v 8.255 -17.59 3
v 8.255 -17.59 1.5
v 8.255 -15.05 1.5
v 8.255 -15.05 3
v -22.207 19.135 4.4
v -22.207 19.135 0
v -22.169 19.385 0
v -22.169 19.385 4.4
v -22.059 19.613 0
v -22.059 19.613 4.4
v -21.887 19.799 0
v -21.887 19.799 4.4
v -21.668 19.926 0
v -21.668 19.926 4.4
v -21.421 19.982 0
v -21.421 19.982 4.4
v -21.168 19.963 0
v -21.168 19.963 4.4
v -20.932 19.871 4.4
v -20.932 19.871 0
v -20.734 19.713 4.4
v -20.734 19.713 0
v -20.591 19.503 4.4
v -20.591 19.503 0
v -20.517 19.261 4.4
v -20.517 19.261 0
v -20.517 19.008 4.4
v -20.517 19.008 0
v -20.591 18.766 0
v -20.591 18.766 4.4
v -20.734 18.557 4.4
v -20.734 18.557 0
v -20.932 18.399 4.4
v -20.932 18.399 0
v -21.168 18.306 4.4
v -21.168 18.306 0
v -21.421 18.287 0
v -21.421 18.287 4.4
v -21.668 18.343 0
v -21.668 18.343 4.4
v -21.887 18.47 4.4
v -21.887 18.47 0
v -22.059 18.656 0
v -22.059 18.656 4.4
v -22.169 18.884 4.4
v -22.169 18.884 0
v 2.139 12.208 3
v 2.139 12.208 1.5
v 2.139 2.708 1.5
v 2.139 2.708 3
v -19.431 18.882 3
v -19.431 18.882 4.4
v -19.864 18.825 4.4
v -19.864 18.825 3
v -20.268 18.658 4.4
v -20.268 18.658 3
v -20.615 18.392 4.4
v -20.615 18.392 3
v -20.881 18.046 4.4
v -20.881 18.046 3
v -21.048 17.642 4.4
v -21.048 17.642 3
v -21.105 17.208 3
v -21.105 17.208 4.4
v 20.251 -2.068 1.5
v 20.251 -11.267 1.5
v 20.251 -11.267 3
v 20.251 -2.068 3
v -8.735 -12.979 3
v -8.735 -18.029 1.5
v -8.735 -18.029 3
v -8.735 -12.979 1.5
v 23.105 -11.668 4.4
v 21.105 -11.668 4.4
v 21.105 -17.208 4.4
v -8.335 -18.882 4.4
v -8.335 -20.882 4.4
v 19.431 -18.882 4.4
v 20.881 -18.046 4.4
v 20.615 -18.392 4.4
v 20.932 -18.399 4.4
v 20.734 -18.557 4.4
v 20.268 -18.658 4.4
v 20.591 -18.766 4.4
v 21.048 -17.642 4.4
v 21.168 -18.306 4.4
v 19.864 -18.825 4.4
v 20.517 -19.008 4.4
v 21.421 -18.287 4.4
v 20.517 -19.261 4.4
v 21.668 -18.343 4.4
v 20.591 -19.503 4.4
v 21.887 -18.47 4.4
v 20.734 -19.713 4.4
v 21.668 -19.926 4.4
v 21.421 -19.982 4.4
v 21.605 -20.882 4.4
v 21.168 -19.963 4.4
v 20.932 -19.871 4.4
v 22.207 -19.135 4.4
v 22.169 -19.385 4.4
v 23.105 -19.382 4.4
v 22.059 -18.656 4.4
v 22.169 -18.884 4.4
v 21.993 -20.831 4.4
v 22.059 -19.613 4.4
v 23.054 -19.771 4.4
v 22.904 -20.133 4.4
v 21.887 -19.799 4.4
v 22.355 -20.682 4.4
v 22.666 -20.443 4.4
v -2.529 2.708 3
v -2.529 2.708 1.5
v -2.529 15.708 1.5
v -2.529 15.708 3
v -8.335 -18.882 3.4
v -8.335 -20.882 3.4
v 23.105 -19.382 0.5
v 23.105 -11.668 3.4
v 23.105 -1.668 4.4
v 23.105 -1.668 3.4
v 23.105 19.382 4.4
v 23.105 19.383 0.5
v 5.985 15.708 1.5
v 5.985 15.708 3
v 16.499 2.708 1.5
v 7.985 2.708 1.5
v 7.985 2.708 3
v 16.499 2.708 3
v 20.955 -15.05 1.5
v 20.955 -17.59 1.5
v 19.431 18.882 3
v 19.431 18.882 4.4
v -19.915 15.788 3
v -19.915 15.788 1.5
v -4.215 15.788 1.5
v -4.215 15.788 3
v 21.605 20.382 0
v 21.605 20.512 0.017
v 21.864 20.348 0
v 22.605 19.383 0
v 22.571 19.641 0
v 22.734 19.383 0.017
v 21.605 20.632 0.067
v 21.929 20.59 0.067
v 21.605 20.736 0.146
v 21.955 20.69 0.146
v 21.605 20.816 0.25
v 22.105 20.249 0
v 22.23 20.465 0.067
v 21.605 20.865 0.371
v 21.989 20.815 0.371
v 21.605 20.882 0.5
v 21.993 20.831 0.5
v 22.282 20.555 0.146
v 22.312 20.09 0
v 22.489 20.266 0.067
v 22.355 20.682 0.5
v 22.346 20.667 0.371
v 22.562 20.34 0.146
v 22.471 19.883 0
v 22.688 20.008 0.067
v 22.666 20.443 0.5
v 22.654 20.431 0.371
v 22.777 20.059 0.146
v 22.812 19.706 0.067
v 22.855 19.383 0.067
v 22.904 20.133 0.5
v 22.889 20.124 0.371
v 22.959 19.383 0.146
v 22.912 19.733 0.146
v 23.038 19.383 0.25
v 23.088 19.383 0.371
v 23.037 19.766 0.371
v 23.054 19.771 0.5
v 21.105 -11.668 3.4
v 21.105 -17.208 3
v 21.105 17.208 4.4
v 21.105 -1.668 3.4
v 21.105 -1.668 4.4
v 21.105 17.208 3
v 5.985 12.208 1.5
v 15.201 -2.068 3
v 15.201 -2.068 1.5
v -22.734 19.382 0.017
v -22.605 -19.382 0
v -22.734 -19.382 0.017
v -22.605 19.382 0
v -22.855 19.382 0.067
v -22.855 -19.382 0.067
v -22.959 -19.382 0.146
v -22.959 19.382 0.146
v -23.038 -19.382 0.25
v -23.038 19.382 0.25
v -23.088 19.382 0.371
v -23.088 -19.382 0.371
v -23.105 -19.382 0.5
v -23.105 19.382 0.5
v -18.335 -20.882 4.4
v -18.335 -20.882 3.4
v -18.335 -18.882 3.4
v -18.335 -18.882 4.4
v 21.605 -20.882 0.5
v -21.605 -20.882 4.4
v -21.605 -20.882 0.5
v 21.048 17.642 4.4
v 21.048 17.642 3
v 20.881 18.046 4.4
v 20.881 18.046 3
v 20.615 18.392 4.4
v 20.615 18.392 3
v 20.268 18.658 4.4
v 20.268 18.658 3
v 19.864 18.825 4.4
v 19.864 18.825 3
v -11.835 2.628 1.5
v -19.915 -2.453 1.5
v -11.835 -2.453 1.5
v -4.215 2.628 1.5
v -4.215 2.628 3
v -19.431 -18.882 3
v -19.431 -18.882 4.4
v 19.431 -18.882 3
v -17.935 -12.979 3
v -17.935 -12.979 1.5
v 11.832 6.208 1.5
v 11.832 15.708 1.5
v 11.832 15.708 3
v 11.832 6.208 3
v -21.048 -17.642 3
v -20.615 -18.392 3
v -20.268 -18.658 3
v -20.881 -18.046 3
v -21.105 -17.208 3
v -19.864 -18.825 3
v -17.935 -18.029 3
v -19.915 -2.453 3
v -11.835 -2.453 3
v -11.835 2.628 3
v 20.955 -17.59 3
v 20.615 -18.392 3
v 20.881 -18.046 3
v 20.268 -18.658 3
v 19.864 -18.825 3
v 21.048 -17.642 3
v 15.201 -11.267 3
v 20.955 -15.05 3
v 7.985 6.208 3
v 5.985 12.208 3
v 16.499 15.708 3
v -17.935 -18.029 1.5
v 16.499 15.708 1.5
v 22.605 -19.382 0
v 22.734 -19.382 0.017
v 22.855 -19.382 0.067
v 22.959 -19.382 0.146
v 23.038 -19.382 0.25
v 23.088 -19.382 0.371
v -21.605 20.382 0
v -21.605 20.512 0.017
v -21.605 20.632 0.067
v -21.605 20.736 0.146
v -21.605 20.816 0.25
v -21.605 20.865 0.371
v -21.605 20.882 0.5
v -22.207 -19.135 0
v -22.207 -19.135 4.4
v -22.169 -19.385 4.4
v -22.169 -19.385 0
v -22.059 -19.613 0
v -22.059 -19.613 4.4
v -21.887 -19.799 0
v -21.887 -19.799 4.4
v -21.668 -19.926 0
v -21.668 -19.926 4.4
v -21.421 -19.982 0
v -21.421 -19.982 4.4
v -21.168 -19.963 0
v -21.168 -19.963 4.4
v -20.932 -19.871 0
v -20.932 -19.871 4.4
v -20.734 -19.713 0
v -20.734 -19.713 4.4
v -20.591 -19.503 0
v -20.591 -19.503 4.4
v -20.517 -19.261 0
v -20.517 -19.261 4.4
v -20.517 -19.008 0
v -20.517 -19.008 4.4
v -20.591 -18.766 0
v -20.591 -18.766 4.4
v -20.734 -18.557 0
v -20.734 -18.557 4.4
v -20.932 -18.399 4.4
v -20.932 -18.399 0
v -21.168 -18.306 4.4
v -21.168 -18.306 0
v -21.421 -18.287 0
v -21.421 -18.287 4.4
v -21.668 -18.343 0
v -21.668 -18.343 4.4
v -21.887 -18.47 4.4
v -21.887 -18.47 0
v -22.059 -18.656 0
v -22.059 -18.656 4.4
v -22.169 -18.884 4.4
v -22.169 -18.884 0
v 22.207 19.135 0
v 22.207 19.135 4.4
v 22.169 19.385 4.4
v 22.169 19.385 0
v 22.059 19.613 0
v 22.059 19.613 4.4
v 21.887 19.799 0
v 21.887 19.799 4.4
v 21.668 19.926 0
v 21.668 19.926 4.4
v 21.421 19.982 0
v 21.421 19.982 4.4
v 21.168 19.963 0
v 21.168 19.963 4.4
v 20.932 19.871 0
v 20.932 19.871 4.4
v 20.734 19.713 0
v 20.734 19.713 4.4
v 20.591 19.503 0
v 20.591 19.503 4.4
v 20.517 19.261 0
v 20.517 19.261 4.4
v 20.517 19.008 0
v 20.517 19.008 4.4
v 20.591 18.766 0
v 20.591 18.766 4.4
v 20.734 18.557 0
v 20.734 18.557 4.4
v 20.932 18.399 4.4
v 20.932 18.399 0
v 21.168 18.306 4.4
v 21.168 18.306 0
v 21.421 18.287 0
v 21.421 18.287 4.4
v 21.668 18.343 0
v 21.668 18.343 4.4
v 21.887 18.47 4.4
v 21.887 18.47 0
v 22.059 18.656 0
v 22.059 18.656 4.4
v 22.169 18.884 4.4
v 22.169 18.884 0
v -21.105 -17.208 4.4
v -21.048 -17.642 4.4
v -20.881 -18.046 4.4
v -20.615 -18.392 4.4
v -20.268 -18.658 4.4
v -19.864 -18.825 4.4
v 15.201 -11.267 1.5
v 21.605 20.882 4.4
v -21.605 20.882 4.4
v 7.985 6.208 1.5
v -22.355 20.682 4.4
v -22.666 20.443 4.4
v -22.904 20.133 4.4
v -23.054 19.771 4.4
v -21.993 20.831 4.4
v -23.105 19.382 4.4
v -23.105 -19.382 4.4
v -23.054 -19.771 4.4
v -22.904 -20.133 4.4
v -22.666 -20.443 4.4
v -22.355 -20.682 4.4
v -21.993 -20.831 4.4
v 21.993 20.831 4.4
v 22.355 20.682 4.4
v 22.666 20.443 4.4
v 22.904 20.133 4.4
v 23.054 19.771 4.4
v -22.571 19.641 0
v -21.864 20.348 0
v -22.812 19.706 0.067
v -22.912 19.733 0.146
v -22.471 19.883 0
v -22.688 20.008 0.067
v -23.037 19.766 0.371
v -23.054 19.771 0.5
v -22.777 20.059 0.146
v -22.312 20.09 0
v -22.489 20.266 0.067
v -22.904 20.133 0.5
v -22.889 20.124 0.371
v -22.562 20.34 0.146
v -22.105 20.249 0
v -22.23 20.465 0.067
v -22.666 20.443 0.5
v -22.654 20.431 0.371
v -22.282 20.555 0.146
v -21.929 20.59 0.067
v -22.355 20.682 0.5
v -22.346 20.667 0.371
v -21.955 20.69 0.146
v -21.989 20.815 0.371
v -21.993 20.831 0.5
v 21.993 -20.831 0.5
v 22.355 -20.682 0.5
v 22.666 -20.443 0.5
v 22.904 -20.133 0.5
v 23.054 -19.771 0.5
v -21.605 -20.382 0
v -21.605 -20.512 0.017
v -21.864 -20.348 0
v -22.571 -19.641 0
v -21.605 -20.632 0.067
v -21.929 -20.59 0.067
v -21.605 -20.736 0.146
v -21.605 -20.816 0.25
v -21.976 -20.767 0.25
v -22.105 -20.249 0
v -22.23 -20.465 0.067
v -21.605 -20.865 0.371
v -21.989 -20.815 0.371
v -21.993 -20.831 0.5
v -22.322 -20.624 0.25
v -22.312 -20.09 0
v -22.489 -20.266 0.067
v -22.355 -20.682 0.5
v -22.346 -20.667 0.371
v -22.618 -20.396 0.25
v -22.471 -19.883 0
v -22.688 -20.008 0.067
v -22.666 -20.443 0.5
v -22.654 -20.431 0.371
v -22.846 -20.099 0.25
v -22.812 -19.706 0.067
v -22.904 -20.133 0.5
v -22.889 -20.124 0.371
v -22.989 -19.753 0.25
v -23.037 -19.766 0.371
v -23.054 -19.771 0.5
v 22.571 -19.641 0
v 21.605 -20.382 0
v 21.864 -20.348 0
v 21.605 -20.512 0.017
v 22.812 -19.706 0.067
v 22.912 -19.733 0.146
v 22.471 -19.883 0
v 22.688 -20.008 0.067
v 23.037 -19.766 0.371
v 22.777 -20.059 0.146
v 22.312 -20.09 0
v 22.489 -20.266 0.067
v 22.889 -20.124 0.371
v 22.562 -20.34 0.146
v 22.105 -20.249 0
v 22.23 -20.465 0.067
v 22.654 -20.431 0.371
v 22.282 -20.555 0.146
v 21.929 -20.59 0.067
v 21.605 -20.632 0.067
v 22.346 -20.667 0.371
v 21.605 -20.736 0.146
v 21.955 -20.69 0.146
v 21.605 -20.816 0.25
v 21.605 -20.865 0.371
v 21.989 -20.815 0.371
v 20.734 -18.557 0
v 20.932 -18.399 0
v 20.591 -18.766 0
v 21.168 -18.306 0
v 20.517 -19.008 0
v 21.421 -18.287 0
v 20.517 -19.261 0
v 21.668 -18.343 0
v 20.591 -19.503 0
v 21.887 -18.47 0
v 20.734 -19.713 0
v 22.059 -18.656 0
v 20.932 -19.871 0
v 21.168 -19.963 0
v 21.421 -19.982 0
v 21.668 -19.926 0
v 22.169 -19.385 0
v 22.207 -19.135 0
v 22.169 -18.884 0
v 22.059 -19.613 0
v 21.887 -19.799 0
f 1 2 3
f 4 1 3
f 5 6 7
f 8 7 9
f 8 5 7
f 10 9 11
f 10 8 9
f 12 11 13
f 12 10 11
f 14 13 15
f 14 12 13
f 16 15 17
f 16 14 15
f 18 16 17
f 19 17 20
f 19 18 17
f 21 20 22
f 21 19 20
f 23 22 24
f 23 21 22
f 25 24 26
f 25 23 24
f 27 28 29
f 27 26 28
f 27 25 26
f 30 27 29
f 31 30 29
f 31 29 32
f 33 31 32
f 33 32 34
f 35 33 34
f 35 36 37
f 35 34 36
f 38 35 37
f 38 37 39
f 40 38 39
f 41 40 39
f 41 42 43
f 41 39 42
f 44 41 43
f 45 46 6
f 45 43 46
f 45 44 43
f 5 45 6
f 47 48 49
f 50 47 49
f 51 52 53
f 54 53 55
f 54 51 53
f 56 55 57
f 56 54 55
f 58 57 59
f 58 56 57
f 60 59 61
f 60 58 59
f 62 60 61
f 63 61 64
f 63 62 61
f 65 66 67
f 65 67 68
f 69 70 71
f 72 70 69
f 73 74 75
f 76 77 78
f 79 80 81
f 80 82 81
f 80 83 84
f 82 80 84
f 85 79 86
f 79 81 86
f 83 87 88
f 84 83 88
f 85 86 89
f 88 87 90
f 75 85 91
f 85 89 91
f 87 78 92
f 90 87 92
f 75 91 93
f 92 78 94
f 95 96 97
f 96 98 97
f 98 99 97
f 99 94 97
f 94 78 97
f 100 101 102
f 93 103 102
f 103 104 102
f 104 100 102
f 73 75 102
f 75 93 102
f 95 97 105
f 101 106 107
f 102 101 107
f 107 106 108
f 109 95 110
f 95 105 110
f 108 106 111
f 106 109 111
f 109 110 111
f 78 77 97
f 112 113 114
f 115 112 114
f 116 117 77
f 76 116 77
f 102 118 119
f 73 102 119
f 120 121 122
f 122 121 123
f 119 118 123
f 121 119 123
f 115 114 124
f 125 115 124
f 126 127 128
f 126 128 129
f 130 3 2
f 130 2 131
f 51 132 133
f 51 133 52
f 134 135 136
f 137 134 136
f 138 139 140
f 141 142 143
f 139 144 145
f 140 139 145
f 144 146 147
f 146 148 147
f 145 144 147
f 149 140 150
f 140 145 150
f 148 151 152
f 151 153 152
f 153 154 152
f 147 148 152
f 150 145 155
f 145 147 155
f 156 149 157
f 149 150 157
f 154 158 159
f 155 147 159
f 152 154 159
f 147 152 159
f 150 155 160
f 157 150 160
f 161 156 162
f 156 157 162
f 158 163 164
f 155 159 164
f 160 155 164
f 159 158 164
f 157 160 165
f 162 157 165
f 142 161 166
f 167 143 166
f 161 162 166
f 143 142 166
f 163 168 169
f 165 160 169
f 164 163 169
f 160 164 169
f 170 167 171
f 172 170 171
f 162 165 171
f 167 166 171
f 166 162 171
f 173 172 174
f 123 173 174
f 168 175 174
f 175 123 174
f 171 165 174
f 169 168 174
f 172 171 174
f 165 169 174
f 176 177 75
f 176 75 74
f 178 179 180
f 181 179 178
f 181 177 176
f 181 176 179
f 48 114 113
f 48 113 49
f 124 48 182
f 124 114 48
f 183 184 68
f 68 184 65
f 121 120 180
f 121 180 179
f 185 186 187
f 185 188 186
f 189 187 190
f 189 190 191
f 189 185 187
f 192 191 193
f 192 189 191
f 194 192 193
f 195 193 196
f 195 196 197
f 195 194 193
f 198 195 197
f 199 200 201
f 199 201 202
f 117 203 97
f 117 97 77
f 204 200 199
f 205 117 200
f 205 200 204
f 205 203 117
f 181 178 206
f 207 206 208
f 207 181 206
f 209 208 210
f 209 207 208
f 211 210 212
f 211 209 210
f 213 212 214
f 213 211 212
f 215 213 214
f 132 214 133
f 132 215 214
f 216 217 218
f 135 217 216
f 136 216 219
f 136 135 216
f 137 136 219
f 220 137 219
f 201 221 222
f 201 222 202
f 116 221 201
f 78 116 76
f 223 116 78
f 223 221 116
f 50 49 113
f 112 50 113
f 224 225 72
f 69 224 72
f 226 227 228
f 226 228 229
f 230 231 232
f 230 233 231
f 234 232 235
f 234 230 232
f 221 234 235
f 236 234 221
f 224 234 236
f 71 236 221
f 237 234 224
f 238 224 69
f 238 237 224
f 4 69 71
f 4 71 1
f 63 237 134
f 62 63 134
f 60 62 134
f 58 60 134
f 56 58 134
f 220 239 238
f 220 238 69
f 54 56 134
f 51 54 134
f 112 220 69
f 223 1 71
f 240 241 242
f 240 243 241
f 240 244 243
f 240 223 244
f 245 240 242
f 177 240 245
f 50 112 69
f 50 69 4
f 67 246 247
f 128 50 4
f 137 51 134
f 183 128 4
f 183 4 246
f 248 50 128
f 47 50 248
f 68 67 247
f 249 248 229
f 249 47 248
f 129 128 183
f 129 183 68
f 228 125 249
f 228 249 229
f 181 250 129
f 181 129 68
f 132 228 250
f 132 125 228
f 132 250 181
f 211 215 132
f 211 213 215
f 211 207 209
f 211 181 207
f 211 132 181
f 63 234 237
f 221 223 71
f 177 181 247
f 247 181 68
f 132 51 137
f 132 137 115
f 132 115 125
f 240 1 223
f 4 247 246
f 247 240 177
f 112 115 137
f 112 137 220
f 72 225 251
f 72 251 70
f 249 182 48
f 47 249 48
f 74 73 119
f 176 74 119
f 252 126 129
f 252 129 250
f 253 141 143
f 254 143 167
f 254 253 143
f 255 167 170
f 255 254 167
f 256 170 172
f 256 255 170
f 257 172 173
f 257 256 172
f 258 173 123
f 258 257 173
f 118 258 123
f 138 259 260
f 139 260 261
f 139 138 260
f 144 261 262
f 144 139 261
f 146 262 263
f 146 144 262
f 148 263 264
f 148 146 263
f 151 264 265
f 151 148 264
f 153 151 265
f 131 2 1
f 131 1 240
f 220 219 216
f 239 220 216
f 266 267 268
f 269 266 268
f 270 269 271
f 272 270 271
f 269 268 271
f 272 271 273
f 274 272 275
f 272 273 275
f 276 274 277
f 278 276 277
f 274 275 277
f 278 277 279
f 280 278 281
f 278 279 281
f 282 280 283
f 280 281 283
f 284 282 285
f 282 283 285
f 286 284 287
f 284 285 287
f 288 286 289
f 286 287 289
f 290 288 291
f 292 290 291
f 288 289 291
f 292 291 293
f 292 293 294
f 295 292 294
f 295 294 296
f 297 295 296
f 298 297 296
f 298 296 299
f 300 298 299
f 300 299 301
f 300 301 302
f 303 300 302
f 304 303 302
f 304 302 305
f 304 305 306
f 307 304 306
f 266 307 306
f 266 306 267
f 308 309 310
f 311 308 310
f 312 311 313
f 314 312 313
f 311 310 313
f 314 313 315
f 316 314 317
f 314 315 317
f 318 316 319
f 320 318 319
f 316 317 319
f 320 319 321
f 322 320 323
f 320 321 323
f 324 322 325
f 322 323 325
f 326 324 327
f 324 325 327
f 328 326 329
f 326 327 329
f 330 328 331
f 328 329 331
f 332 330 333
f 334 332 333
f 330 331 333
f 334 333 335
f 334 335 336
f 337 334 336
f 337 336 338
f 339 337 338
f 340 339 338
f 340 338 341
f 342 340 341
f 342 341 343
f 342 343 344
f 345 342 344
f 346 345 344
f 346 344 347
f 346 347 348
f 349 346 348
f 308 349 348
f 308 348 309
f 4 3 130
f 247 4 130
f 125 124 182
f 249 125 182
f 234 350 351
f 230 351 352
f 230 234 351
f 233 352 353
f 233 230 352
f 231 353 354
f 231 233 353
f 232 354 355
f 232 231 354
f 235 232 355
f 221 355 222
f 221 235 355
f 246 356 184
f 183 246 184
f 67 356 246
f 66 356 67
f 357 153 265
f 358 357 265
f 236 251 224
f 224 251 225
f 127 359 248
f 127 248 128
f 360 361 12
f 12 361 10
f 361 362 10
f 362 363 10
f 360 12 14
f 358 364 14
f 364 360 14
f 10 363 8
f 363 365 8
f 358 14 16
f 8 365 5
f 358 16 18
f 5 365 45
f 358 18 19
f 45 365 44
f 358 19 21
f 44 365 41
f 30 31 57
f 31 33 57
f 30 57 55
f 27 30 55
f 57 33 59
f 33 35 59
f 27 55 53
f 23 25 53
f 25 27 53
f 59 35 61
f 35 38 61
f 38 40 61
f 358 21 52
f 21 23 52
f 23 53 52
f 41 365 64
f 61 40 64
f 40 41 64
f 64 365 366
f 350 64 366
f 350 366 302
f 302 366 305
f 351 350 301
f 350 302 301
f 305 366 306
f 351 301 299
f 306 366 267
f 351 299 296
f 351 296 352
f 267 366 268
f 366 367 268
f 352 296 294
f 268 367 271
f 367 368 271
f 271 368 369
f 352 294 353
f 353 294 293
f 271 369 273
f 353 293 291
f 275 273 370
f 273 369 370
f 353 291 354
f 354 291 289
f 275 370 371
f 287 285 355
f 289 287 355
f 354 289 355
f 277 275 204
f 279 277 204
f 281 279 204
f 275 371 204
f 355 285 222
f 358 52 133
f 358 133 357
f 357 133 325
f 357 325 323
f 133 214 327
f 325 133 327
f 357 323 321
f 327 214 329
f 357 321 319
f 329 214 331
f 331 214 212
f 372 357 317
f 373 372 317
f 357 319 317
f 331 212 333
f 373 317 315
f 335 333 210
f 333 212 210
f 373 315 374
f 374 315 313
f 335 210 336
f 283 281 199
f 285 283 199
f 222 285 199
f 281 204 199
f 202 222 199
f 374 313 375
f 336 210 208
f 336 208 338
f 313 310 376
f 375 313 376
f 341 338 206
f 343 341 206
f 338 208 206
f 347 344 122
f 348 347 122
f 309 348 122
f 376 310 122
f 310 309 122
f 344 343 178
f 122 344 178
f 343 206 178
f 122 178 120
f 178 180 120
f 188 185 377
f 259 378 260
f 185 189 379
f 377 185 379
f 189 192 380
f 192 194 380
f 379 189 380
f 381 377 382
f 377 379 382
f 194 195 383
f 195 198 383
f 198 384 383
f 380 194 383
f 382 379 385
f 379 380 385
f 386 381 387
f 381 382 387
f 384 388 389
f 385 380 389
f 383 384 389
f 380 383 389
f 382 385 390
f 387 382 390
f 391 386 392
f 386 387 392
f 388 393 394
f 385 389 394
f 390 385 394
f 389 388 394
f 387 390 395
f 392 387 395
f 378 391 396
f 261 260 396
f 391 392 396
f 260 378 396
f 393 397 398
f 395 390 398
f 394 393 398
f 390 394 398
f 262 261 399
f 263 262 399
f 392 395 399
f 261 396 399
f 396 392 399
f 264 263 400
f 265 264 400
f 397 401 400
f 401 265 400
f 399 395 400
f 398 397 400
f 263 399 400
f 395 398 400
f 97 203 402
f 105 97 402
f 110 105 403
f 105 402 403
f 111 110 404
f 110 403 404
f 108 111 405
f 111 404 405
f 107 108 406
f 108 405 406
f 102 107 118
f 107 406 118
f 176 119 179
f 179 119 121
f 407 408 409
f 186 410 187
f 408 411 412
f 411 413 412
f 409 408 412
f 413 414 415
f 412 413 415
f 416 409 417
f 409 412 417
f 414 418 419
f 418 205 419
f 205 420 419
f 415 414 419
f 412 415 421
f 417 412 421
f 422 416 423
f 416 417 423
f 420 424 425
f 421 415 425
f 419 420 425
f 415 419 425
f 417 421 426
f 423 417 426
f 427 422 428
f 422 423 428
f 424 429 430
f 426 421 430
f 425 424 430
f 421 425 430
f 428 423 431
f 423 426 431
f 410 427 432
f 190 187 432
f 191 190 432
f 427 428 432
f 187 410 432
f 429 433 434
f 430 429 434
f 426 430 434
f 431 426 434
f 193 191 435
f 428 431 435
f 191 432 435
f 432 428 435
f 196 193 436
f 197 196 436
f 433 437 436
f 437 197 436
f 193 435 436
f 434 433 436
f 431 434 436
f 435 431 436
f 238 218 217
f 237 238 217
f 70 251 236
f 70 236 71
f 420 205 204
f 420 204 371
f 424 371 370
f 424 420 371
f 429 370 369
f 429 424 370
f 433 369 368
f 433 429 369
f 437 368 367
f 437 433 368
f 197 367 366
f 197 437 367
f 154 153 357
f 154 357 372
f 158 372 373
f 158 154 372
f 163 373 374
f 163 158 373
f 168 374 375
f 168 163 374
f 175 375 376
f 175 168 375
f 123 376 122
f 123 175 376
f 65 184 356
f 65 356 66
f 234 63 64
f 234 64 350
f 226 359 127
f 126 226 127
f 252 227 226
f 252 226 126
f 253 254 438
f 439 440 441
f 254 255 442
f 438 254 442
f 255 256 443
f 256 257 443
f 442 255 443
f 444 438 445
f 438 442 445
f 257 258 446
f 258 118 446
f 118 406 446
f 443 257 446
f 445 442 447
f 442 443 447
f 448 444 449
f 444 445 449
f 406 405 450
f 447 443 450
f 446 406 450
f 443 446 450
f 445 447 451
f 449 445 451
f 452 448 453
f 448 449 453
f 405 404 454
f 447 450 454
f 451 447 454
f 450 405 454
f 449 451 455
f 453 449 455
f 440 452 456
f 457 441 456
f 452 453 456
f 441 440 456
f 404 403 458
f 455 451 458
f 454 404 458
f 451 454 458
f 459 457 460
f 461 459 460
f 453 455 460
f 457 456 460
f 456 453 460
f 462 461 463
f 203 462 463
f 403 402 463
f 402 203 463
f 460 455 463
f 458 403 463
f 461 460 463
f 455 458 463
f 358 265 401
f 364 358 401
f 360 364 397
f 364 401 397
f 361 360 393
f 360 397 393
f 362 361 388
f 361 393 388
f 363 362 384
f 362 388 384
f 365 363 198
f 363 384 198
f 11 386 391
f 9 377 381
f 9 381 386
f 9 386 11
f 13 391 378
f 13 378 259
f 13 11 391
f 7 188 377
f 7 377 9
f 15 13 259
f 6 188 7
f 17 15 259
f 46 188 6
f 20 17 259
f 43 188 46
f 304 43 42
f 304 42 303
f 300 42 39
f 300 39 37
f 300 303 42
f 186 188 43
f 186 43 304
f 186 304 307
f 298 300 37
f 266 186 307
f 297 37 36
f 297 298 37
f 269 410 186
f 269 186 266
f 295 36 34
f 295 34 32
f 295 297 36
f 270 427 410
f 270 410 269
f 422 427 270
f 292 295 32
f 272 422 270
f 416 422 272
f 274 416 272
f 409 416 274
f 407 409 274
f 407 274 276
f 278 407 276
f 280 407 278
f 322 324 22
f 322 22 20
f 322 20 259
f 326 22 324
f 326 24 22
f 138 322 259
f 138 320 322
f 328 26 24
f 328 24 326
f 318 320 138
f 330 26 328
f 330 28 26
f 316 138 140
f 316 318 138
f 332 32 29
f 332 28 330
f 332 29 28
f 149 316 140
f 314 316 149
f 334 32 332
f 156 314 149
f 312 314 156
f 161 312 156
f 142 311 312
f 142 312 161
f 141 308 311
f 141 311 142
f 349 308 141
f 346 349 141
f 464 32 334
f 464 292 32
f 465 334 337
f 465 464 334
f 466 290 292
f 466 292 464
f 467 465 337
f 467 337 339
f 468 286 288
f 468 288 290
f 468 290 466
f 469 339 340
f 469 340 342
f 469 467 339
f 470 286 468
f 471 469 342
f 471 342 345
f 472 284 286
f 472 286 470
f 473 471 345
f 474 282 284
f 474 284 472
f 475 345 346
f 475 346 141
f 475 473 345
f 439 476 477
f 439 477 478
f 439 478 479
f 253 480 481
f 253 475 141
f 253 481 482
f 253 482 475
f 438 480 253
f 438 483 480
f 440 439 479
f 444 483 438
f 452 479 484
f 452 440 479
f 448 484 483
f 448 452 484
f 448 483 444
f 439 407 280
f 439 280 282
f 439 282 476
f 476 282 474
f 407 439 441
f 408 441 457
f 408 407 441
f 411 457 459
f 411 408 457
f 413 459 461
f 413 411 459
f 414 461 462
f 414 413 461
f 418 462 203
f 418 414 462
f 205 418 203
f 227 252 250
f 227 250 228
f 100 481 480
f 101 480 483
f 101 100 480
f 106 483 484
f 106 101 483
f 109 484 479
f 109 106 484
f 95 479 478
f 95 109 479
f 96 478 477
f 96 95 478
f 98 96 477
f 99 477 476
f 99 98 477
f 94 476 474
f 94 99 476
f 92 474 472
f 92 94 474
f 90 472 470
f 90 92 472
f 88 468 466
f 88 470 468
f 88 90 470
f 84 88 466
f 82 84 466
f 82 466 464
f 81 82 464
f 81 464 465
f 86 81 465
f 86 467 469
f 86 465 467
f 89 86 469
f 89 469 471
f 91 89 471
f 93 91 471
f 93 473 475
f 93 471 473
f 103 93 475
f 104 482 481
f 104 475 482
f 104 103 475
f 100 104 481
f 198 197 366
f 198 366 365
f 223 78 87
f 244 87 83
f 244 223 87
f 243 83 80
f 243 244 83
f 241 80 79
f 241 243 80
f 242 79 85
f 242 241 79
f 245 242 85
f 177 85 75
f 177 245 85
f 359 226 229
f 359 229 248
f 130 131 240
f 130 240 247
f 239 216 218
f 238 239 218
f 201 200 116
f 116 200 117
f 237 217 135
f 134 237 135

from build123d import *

# Parameters (mm, degrees)
BOSS_EXTRUDE1_DEPTH     = 4.4
BOSS_EXTRUDE2_DEPTH     = 1.5
SKETCH3_W               = 42.21
SKETCH3_H               = 37.765
SKETCH3_W_2             = 5.0500889
SKETCH3_H_2             = 9.1998476
SKETCH3_W_3             = 9.1998476
SKETCH3_H_3             = 5.0500889
SKETCH3_W_4             = 12.70002032
SKETCH3_H_4             = 2.54
BOSS_EXTRUDE3_DEPTH     = 1.5
BOSS_EXTRUDE4_START     = -4.4
BOSS_EXTRUDE4_DEPTH     = 4.4
SKETCH4_R               = 0.85
CUT_EXTRUDE1_DEPTH      = 32.45281913
MIRROR2_START           = -4.4
MIRROR2_COPY_1_DEPTH    = 4.4
MIRROR2_COPY_2_SKETCH_R = 0.85
MIRROR2_COPY_2_DEPTH    = 32.45281913
FILLET1_R               = 0.5
SKETCH7_W               = 10
SKETCH7_H               = 1
CUT_EXTRUDE2_DEPTH      = 3
SKETCH8_W               = 1
SKETCH8_H               = 10
CUT_EXTRUDE3_DEPTH      = 3


with BuildPart() as part:
    # Sketch1 → Boss-Extrude1 (new body)
    with BuildSketch(Plane.XY):
        with BuildLine():
            Line((-19.431, 20.8825), (19.431, 20.8825))
            ThreePointArc((19.431, 20.8825), (22.028910314, 19.806410314), (23.105, 17.2085))
            Line((23.105, 17.2085), (23.105, -17.2085))
            ThreePointArc((23.105, -17.2085), (22.028910314, -19.806410314), (19.431, -20.8825))
            Line((19.431, -20.8825), (-19.431, -20.8825))
            ThreePointArc((-19.431, -20.8825), (-22.028910314, -19.806410314), (-23.105, -17.2085))
            Line((-23.105, -17.2085), (-23.105, 17.2085))
            ThreePointArc((-23.105, 17.2085), (-22.028910314, 19.806410314), (-19.431, 20.8825))
        make_face()
        with BuildLine():
            Line((-19.431, -18.8825), (19.431, -18.8825))
            ThreePointArc((19.431, -18.8825), (20.614696752, -18.392196752), (21.105, -17.2085))
            Line((21.105, -17.2085), (21.105, 17.2085))
            ThreePointArc((21.105, 17.2085), (20.614696752, 18.392196752), (19.431, 18.8825))
            Line((19.431, 18.8825), (-19.431, 18.8825))
            ThreePointArc((-19.431, 18.8825), (-20.614696752, 18.392196752), (-21.105, 17.2085))
            Line((-21.105, 17.2085), (-21.105, -17.2085))
            ThreePointArc((-21.105, -17.2085), (-20.614696752, -18.392196752), (-19.431, -18.8825))
        make_face(mode=Mode.SUBTRACT)
    extrude(amount=BOSS_EXTRUDE1_DEPTH)

    # Sketch2 → Boss-Extrude2 (add)
    with BuildSketch(Plane(origin=(0, 0, 0), x_dir=(-1, 0, 0), z_dir=(0, 0, -1))):
        with BuildLine():
            Line((21.105, 17.2085), (21.105, -17.2085))
            ThreePointArc((21.105, -17.2085), (20.614696752, -18.392196752), (19.431, -18.8825))
            Line((19.431, -18.8825), (-19.431, -18.8825))
            ThreePointArc((-19.431, -18.8825), (-20.614696752, -18.392196752), (-21.105, -17.2085))
            Line((-21.105, -17.2085), (-21.105, 17.2085))
            ThreePointArc((-21.105, 17.2085), (-20.614696752, 18.392196752), (-19.431, 18.8825))
            Line((-19.431, 18.8825), (19.431, 18.8825))
            ThreePointArc((19.431, 18.8825), (20.614696752, 18.392196752), (21.105, 17.2085))
        make_face()
    extrude(amount=-BOSS_EXTRUDE2_DEPTH)

    # Sketch3 → Boss-Extrude3 (add)
    with BuildSketch(Plane.XY.offset(1.5)):
        Rectangle(SKETCH3_W, SKETCH3_H)
        Polygon((-19.91503683, 15.787528575), (-4.21501143, 15.787528575), (-4.21501143, 2.627508255), (-11.83502667, 2.627508255), (-11.83502667, -2.452501905), (-19.91503683, -2.452501905), align=None, mode=Mode.SUBTRACT)
        Polygon((5.98500889, 15.707528575), (5.98500889, 12.207528575), (2.138501397, 12.207528575), (2.138501397, 2.707508255), (-2.528503937, 2.707508255), (-2.528503937, 15.707528575), align=None, mode=Mode.SUBTRACT)
        Polygon((16.498531877, 2.707508255), (16.498531877, 15.707528575), (11.831526543, 15.707528575), (11.831526543, 6.207508255), (7.98501905, 6.207508255), (7.98501905, 2.707508255), align=None, mode=Mode.SUBTRACT)
        with Locations((17.726060452, -6.667513335)):
            Rectangle(SKETCH3_W_2, SKETCH3_H_2, mode=Mode.SUBTRACT)
        with Locations((-13.33502667, -15.503556007)):
            Rectangle(SKETCH3_W_3, SKETCH3_H_3, mode=Mode.SUBTRACT)
        with Locations((14.60502921, -16.319532639)):
            Rectangle(SKETCH3_W_4, SKETCH3_H_4, mode=Mode.SUBTRACT)
    extrude(amount=BOSS_EXTRUDE3_DEPTH)

    # Sketch5 → Boss-Extrude4 (add)
    with BuildSketch(Plane.XY.offset(4.4).offset(BOSS_EXTRUDE4_START)):
        with BuildLine():
            Line((19.431, 20.8825), (21.605, 20.8825))
            ThreePointArc((21.605, 20.8825), (22.665660172, 20.443160172), (23.105, 19.3825))
            Line((23.105, 19.3825), (23.105, 17.2085))
            ThreePointArc((23.105, 17.2085), (22.028910314, 19.806410314), (19.431, 20.8825))
        make_face()
    boss_extrude4 = extrude(amount=BOSS_EXTRUDE4_DEPTH)

    # Sketch4 → Cut-Extrude1 (cut, through all)
    with BuildSketch(Plane.XY.offset(4.4)):
        with Locations((21.357158872, 19.134658872)):
            Circle(SKETCH4_R)
    cut_extrude1 = extrude(amount=-CUT_EXTRUDE1_DEPTH, mode=Mode.SUBTRACT)

    # Mirror1: Boss-Extrude4, Cut-Extrude1 across plane
    add(boss_extrude4.mirror(Plane(origin=(0, 0, 0), x_dir=(0, 0, 1), z_dir=(1, 0, 0))))
    add(cut_extrude1.mirror(Plane(origin=(0, 0, 0), x_dir=(0, 0, 1), z_dir=(1, 0, 0))), mode=Mode.SUBTRACT)

    # Mirror2: Boss-Extrude4, Cut-Extrude1 across plane
    add(boss_extrude4.mirror(Plane.ZX))
    add(cut_extrude1.mirror(Plane.ZX), mode=Mode.SUBTRACT)

    # Mirror2 copy 1 sketch → Mirror2 copy 1 (add)
    with BuildSketch(Plane(origin=(0, 0, 4.4), x_dir=(-1, 0, 0), z_dir=(0, 0, 1)).offset(MIRROR2_START)):
        with BuildLine():
            Line((19.431, 20.8825), (21.605, 20.8825))
            ThreePointArc((21.605, 20.8825), (22.665660172, 20.443160172), (23.105, 19.3825))
            Line((23.105, 19.3825), (23.105, 17.2085))
            ThreePointArc((23.105, 17.2085), (22.028910314, 19.806410314), (19.431, 20.8825))
        make_face()
    extrude(amount=MIRROR2_COPY_1_DEPTH)

    # Mirror2 copy 2 sketch → Mirror2 copy 2 (cut, through all)
    with BuildSketch(Plane(origin=(0, 0, 4.4), x_dir=(-1, 0, 0), z_dir=(0, 0, 1))):
        with Locations((21.357158872, 19.134658872)):
            Circle(MIRROR2_COPY_2_SKETCH_R)
    extrude(amount=-MIRROR2_COPY_2_DEPTH, mode=Mode.SUBTRACT)

    # Fillet1
    fillet1_edges = [part.edges().sort_by_distance(p)[0] for p in [
        (-23.105, 0, 0),
        (22.665660172, 20.443160172, 0),
        (-22.665660172, 20.443160172, 0),
        (-22.665660172, -20.443160172, 0),
        (22.665660172, -20.443160172, 0),
        (0, 20.8825, 0),
        (23.105, 0, 0),
        (0, -20.8825, 0),
    ]]
    fillet(fillet1_edges, radius=FILLET1_R)

    # Sketch7 → Cut-Extrude2 (cut)
    with BuildSketch(Plane.XZ.offset(20.8825)):
        with Locations((-13.33502667, 3.9)):
            Rectangle(SKETCH7_W, SKETCH7_H)
    extrude(amount=-CUT_EXTRUDE2_DEPTH, mode=Mode.SUBTRACT)

    # Sketch8 → Cut-Extrude3 (cut)
    with BuildSketch(Plane(origin=(23.105, 0, 0), x_dir=(0, 0, -1), z_dir=(1, 0, 0))):
        with Locations((-3.9, -6.667513335)):
            Rectangle(SKETCH8_W, SKETCH8_H)
    extrude(amount=-CUT_EXTRUDE3_DEPTH, mode=Mode.SUBTRACT)


solid = part.part
